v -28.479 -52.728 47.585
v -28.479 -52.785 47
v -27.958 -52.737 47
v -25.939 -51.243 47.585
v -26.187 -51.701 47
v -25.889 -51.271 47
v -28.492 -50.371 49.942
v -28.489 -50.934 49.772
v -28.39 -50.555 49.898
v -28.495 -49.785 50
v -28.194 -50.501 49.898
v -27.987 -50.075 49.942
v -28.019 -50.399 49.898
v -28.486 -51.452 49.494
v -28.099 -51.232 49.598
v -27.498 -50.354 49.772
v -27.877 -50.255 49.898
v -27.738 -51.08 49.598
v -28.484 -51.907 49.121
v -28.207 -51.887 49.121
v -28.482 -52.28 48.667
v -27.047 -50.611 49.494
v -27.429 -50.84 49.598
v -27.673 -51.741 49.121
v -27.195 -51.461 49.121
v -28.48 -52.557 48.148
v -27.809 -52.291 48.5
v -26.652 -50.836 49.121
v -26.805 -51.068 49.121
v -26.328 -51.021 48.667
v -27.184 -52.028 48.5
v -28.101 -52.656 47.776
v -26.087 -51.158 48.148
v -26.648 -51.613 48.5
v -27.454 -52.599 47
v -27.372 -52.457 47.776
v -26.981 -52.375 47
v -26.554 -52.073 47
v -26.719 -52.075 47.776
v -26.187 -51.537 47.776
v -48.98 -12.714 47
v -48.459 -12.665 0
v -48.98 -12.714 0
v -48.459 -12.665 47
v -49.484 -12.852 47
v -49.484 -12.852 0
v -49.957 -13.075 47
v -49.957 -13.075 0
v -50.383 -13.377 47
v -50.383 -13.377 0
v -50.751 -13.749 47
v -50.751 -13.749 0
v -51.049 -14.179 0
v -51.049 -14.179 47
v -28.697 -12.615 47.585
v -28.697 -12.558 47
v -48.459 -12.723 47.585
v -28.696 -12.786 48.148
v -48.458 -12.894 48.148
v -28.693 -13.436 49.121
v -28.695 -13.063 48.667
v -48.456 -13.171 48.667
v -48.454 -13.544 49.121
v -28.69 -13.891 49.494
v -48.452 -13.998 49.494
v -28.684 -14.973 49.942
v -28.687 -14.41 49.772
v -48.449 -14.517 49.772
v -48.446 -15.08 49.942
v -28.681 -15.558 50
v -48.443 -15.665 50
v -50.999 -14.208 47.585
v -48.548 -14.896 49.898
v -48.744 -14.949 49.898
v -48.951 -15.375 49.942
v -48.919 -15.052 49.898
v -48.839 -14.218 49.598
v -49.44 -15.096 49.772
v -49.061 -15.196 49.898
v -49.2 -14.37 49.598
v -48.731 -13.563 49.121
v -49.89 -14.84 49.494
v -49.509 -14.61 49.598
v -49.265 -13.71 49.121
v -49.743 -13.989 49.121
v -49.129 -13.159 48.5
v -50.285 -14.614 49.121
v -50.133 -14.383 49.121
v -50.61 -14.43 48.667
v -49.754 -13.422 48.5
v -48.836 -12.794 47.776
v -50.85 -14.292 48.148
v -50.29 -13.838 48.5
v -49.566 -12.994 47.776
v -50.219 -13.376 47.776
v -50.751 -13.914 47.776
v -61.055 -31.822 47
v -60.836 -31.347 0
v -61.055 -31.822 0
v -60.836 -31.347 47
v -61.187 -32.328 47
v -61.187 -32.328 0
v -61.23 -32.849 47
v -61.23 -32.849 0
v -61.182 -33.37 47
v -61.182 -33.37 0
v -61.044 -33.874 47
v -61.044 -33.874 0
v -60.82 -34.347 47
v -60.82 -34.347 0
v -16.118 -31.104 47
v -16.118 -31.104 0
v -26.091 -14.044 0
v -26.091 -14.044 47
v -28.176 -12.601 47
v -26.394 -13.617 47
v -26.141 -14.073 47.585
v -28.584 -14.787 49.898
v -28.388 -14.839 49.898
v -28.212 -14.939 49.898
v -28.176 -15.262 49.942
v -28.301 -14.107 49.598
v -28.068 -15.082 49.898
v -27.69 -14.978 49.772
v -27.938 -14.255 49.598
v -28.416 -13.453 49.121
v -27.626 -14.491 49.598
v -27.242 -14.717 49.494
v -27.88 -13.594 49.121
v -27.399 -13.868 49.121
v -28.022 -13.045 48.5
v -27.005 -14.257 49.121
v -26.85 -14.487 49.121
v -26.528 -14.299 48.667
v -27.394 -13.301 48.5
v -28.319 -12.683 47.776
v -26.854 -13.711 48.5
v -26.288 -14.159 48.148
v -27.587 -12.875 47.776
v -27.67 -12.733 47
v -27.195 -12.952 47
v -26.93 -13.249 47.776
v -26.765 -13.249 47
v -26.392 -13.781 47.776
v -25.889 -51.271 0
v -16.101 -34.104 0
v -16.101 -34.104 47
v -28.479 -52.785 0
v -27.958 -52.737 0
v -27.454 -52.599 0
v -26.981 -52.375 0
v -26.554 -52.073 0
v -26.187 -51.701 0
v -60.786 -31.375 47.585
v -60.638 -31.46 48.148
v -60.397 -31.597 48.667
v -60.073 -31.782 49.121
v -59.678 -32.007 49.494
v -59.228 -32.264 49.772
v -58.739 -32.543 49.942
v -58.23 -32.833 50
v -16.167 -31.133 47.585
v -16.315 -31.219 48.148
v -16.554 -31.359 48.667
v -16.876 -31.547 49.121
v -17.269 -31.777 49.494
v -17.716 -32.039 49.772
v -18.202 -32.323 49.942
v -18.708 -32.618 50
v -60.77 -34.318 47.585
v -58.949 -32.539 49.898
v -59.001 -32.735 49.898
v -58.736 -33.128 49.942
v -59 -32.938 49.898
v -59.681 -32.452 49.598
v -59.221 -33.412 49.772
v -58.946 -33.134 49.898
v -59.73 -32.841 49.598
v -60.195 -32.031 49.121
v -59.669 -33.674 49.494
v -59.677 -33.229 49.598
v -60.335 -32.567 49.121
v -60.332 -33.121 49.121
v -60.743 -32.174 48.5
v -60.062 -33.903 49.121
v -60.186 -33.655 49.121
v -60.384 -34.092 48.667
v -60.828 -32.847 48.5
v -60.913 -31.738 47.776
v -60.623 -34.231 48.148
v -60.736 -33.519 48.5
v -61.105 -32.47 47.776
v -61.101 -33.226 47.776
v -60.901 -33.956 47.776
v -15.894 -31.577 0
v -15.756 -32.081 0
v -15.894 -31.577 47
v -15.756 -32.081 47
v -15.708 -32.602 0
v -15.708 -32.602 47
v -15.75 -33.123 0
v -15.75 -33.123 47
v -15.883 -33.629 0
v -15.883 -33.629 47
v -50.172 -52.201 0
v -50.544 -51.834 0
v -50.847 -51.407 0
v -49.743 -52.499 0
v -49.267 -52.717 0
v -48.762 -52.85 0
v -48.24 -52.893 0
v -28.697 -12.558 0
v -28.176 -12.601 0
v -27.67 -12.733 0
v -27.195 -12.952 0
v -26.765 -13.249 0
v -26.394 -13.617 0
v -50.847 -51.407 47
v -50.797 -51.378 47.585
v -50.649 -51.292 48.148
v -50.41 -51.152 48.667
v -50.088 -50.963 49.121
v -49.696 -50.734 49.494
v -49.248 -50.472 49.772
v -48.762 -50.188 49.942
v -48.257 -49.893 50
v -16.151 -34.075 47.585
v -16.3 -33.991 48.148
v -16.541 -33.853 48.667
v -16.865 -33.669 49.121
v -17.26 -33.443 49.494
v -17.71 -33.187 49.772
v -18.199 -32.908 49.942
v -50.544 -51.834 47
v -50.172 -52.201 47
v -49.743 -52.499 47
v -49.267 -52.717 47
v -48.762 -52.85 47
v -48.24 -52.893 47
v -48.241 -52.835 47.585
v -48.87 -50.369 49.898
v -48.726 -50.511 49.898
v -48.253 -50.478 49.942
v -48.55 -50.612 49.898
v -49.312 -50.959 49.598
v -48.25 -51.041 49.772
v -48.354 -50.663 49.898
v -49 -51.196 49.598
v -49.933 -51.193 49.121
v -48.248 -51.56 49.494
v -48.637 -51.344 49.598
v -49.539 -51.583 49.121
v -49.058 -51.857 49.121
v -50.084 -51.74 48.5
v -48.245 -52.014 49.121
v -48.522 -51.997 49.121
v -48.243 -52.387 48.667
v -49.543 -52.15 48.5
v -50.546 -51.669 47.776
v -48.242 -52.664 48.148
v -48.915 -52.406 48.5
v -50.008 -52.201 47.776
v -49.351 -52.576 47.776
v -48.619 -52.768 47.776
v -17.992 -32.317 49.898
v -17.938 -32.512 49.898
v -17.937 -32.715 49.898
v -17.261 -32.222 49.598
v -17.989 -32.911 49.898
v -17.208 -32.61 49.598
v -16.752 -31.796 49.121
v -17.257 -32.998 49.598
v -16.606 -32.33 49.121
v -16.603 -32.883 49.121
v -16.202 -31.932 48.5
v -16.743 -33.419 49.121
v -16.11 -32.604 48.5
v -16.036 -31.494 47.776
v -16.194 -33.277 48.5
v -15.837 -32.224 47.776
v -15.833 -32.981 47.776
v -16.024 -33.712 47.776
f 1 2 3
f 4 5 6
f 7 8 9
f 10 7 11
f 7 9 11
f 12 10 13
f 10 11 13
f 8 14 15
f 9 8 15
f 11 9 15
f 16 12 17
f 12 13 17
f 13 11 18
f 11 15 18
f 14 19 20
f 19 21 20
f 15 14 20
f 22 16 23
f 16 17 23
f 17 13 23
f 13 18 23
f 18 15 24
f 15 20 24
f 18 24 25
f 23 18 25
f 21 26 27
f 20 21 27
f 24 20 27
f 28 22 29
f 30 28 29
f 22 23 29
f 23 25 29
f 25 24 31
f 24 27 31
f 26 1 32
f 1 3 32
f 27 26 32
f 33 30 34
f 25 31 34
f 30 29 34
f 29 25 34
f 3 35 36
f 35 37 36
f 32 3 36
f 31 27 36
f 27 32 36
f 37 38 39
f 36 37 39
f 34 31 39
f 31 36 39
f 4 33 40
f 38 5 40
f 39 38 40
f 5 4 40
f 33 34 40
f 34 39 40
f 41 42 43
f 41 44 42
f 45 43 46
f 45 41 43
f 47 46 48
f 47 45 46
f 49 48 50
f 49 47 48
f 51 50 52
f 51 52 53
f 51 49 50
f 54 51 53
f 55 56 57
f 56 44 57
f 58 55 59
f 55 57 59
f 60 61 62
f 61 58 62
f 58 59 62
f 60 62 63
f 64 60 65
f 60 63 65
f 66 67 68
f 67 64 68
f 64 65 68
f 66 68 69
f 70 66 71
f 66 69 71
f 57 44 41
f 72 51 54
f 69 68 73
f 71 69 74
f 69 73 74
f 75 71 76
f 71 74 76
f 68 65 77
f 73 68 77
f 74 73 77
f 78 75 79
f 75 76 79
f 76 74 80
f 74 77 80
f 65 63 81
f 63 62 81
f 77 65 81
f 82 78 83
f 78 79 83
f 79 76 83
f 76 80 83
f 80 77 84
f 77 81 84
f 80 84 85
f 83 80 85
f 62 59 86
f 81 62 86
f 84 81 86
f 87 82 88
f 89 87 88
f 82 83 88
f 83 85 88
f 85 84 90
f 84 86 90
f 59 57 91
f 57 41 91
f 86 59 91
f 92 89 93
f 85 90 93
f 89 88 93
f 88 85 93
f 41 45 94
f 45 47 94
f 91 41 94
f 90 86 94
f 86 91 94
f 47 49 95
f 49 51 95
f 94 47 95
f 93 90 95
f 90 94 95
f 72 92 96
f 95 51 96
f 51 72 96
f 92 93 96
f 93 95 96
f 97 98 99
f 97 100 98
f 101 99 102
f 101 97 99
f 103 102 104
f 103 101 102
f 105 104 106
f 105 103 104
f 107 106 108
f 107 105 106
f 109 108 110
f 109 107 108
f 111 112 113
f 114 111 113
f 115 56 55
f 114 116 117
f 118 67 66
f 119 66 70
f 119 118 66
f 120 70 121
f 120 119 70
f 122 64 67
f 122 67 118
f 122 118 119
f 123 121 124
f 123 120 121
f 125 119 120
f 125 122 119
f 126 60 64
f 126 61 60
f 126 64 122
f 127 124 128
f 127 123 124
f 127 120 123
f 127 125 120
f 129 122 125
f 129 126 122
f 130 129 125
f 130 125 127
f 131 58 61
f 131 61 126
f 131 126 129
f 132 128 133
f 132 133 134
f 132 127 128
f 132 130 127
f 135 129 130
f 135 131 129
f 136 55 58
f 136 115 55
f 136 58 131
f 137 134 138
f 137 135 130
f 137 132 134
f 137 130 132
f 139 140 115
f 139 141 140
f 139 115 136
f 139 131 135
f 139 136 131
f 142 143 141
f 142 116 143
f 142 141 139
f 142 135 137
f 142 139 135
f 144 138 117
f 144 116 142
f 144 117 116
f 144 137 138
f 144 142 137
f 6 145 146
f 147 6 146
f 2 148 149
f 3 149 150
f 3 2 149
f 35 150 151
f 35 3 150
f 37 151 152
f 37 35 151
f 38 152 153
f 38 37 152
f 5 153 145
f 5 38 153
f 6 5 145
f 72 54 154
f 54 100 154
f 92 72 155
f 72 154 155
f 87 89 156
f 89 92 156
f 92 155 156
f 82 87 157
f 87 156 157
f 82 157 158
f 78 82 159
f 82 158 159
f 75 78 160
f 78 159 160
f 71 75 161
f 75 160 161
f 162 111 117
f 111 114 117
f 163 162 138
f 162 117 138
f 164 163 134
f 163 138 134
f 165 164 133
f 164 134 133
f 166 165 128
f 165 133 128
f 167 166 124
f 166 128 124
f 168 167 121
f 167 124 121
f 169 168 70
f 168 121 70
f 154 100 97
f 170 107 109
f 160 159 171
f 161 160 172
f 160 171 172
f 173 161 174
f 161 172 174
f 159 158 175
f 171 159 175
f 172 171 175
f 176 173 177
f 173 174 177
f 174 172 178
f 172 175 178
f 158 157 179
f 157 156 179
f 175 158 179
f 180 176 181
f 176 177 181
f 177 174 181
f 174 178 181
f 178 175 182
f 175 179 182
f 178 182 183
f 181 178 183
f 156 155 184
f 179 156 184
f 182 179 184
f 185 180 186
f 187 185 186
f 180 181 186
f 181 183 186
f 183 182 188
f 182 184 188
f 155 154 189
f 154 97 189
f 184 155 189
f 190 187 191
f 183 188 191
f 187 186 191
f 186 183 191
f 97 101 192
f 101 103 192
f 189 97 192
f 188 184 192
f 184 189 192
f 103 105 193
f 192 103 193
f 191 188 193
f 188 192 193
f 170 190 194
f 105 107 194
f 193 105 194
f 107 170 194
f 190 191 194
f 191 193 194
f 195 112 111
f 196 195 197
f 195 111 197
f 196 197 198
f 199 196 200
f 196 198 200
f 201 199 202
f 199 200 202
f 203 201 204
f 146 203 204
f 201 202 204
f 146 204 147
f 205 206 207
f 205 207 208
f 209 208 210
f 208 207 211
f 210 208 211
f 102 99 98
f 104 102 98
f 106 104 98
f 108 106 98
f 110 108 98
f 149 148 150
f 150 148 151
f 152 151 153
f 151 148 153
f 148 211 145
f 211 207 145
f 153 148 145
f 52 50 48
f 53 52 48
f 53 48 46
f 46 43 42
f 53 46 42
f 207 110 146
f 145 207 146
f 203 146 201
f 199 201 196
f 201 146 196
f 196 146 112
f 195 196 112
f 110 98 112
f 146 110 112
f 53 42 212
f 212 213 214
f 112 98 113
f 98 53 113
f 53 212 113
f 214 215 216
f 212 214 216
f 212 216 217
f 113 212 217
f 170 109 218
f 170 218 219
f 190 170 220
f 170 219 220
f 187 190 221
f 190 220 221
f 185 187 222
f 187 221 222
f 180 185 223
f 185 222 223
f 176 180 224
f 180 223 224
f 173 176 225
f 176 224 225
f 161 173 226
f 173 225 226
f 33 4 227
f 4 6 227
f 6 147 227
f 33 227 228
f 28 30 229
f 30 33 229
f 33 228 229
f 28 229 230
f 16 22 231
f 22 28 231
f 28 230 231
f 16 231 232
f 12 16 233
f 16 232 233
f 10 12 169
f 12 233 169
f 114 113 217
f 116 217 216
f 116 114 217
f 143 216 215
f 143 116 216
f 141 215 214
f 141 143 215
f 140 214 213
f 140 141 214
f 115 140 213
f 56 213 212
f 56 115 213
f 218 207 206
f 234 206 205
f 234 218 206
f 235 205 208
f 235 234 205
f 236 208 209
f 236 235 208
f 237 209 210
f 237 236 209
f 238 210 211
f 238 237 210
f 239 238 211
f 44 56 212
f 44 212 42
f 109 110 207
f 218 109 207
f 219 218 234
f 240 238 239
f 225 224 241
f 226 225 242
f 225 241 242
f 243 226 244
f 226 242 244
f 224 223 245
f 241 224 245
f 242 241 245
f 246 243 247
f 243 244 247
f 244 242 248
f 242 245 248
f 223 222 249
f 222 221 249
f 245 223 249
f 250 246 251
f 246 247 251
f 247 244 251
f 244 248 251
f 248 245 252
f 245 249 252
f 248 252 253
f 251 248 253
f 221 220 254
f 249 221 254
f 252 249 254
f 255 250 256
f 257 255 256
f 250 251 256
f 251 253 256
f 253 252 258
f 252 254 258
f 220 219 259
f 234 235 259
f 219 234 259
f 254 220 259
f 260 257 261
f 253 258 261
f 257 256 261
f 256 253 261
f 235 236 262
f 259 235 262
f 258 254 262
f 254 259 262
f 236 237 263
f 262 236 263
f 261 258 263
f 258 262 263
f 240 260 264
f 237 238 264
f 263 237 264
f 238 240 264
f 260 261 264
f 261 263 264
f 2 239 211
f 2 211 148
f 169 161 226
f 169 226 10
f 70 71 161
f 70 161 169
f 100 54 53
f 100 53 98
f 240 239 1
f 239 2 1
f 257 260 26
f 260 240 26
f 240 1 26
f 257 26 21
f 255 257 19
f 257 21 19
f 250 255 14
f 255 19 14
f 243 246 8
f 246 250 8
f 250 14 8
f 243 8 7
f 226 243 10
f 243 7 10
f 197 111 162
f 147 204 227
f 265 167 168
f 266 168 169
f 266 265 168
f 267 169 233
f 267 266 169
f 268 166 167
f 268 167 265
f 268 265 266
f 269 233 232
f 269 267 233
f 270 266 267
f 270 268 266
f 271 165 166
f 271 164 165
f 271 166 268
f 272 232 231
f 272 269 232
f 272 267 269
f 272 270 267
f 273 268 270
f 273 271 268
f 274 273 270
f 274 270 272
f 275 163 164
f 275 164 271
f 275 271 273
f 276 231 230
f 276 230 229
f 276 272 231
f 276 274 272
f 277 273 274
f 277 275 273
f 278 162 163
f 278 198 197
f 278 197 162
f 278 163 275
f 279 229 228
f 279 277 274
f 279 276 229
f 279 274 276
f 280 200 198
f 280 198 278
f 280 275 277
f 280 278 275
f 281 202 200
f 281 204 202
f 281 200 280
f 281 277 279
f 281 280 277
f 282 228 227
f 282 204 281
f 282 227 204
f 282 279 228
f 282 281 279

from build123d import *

# Parameters (mm, degrees)
F1_DEPTH = 50
F2_R     = 3


with BuildPart() as f1:
    # F0 (on Top) → F1 (new body)
    with BuildSketch(Plane.XY):
        Polygon((-15.243491, -32.599138), (-26.965457, -12.548407), (-50.190882, -12.674562), (-61.694341, -32.851448), (-49.972375, -52.902179), (-26.74695, -52.776024), align=None)
    extrude(amount=F1_DEPTH)

    # F2
    f2_edges = [f1.edges().sort_by_distance(p)[0] for p in [
        (-38.578169, -12.611485, 50),
        (-55.942612, -22.763005, 50),
        (-55.833358, -42.876814, 50),
        (-21.104474, -22.573773, 50),
        (-38.359663, -52.839102, 50),
        (-20.99522, -42.687581, 50),
        (-50.190882, -12.674562, 25),
        (-61.694341, -32.851448, 25),
        (-26.965457, -12.548407, 25),
        (-15.243491, -32.599138, 25),
        (-26.74695, -52.776024, 25),
        (-49.972375, -52.902179, 25),
    ]]
    fillet(f2_edges, radius=F2_R)


solid = f1.part
